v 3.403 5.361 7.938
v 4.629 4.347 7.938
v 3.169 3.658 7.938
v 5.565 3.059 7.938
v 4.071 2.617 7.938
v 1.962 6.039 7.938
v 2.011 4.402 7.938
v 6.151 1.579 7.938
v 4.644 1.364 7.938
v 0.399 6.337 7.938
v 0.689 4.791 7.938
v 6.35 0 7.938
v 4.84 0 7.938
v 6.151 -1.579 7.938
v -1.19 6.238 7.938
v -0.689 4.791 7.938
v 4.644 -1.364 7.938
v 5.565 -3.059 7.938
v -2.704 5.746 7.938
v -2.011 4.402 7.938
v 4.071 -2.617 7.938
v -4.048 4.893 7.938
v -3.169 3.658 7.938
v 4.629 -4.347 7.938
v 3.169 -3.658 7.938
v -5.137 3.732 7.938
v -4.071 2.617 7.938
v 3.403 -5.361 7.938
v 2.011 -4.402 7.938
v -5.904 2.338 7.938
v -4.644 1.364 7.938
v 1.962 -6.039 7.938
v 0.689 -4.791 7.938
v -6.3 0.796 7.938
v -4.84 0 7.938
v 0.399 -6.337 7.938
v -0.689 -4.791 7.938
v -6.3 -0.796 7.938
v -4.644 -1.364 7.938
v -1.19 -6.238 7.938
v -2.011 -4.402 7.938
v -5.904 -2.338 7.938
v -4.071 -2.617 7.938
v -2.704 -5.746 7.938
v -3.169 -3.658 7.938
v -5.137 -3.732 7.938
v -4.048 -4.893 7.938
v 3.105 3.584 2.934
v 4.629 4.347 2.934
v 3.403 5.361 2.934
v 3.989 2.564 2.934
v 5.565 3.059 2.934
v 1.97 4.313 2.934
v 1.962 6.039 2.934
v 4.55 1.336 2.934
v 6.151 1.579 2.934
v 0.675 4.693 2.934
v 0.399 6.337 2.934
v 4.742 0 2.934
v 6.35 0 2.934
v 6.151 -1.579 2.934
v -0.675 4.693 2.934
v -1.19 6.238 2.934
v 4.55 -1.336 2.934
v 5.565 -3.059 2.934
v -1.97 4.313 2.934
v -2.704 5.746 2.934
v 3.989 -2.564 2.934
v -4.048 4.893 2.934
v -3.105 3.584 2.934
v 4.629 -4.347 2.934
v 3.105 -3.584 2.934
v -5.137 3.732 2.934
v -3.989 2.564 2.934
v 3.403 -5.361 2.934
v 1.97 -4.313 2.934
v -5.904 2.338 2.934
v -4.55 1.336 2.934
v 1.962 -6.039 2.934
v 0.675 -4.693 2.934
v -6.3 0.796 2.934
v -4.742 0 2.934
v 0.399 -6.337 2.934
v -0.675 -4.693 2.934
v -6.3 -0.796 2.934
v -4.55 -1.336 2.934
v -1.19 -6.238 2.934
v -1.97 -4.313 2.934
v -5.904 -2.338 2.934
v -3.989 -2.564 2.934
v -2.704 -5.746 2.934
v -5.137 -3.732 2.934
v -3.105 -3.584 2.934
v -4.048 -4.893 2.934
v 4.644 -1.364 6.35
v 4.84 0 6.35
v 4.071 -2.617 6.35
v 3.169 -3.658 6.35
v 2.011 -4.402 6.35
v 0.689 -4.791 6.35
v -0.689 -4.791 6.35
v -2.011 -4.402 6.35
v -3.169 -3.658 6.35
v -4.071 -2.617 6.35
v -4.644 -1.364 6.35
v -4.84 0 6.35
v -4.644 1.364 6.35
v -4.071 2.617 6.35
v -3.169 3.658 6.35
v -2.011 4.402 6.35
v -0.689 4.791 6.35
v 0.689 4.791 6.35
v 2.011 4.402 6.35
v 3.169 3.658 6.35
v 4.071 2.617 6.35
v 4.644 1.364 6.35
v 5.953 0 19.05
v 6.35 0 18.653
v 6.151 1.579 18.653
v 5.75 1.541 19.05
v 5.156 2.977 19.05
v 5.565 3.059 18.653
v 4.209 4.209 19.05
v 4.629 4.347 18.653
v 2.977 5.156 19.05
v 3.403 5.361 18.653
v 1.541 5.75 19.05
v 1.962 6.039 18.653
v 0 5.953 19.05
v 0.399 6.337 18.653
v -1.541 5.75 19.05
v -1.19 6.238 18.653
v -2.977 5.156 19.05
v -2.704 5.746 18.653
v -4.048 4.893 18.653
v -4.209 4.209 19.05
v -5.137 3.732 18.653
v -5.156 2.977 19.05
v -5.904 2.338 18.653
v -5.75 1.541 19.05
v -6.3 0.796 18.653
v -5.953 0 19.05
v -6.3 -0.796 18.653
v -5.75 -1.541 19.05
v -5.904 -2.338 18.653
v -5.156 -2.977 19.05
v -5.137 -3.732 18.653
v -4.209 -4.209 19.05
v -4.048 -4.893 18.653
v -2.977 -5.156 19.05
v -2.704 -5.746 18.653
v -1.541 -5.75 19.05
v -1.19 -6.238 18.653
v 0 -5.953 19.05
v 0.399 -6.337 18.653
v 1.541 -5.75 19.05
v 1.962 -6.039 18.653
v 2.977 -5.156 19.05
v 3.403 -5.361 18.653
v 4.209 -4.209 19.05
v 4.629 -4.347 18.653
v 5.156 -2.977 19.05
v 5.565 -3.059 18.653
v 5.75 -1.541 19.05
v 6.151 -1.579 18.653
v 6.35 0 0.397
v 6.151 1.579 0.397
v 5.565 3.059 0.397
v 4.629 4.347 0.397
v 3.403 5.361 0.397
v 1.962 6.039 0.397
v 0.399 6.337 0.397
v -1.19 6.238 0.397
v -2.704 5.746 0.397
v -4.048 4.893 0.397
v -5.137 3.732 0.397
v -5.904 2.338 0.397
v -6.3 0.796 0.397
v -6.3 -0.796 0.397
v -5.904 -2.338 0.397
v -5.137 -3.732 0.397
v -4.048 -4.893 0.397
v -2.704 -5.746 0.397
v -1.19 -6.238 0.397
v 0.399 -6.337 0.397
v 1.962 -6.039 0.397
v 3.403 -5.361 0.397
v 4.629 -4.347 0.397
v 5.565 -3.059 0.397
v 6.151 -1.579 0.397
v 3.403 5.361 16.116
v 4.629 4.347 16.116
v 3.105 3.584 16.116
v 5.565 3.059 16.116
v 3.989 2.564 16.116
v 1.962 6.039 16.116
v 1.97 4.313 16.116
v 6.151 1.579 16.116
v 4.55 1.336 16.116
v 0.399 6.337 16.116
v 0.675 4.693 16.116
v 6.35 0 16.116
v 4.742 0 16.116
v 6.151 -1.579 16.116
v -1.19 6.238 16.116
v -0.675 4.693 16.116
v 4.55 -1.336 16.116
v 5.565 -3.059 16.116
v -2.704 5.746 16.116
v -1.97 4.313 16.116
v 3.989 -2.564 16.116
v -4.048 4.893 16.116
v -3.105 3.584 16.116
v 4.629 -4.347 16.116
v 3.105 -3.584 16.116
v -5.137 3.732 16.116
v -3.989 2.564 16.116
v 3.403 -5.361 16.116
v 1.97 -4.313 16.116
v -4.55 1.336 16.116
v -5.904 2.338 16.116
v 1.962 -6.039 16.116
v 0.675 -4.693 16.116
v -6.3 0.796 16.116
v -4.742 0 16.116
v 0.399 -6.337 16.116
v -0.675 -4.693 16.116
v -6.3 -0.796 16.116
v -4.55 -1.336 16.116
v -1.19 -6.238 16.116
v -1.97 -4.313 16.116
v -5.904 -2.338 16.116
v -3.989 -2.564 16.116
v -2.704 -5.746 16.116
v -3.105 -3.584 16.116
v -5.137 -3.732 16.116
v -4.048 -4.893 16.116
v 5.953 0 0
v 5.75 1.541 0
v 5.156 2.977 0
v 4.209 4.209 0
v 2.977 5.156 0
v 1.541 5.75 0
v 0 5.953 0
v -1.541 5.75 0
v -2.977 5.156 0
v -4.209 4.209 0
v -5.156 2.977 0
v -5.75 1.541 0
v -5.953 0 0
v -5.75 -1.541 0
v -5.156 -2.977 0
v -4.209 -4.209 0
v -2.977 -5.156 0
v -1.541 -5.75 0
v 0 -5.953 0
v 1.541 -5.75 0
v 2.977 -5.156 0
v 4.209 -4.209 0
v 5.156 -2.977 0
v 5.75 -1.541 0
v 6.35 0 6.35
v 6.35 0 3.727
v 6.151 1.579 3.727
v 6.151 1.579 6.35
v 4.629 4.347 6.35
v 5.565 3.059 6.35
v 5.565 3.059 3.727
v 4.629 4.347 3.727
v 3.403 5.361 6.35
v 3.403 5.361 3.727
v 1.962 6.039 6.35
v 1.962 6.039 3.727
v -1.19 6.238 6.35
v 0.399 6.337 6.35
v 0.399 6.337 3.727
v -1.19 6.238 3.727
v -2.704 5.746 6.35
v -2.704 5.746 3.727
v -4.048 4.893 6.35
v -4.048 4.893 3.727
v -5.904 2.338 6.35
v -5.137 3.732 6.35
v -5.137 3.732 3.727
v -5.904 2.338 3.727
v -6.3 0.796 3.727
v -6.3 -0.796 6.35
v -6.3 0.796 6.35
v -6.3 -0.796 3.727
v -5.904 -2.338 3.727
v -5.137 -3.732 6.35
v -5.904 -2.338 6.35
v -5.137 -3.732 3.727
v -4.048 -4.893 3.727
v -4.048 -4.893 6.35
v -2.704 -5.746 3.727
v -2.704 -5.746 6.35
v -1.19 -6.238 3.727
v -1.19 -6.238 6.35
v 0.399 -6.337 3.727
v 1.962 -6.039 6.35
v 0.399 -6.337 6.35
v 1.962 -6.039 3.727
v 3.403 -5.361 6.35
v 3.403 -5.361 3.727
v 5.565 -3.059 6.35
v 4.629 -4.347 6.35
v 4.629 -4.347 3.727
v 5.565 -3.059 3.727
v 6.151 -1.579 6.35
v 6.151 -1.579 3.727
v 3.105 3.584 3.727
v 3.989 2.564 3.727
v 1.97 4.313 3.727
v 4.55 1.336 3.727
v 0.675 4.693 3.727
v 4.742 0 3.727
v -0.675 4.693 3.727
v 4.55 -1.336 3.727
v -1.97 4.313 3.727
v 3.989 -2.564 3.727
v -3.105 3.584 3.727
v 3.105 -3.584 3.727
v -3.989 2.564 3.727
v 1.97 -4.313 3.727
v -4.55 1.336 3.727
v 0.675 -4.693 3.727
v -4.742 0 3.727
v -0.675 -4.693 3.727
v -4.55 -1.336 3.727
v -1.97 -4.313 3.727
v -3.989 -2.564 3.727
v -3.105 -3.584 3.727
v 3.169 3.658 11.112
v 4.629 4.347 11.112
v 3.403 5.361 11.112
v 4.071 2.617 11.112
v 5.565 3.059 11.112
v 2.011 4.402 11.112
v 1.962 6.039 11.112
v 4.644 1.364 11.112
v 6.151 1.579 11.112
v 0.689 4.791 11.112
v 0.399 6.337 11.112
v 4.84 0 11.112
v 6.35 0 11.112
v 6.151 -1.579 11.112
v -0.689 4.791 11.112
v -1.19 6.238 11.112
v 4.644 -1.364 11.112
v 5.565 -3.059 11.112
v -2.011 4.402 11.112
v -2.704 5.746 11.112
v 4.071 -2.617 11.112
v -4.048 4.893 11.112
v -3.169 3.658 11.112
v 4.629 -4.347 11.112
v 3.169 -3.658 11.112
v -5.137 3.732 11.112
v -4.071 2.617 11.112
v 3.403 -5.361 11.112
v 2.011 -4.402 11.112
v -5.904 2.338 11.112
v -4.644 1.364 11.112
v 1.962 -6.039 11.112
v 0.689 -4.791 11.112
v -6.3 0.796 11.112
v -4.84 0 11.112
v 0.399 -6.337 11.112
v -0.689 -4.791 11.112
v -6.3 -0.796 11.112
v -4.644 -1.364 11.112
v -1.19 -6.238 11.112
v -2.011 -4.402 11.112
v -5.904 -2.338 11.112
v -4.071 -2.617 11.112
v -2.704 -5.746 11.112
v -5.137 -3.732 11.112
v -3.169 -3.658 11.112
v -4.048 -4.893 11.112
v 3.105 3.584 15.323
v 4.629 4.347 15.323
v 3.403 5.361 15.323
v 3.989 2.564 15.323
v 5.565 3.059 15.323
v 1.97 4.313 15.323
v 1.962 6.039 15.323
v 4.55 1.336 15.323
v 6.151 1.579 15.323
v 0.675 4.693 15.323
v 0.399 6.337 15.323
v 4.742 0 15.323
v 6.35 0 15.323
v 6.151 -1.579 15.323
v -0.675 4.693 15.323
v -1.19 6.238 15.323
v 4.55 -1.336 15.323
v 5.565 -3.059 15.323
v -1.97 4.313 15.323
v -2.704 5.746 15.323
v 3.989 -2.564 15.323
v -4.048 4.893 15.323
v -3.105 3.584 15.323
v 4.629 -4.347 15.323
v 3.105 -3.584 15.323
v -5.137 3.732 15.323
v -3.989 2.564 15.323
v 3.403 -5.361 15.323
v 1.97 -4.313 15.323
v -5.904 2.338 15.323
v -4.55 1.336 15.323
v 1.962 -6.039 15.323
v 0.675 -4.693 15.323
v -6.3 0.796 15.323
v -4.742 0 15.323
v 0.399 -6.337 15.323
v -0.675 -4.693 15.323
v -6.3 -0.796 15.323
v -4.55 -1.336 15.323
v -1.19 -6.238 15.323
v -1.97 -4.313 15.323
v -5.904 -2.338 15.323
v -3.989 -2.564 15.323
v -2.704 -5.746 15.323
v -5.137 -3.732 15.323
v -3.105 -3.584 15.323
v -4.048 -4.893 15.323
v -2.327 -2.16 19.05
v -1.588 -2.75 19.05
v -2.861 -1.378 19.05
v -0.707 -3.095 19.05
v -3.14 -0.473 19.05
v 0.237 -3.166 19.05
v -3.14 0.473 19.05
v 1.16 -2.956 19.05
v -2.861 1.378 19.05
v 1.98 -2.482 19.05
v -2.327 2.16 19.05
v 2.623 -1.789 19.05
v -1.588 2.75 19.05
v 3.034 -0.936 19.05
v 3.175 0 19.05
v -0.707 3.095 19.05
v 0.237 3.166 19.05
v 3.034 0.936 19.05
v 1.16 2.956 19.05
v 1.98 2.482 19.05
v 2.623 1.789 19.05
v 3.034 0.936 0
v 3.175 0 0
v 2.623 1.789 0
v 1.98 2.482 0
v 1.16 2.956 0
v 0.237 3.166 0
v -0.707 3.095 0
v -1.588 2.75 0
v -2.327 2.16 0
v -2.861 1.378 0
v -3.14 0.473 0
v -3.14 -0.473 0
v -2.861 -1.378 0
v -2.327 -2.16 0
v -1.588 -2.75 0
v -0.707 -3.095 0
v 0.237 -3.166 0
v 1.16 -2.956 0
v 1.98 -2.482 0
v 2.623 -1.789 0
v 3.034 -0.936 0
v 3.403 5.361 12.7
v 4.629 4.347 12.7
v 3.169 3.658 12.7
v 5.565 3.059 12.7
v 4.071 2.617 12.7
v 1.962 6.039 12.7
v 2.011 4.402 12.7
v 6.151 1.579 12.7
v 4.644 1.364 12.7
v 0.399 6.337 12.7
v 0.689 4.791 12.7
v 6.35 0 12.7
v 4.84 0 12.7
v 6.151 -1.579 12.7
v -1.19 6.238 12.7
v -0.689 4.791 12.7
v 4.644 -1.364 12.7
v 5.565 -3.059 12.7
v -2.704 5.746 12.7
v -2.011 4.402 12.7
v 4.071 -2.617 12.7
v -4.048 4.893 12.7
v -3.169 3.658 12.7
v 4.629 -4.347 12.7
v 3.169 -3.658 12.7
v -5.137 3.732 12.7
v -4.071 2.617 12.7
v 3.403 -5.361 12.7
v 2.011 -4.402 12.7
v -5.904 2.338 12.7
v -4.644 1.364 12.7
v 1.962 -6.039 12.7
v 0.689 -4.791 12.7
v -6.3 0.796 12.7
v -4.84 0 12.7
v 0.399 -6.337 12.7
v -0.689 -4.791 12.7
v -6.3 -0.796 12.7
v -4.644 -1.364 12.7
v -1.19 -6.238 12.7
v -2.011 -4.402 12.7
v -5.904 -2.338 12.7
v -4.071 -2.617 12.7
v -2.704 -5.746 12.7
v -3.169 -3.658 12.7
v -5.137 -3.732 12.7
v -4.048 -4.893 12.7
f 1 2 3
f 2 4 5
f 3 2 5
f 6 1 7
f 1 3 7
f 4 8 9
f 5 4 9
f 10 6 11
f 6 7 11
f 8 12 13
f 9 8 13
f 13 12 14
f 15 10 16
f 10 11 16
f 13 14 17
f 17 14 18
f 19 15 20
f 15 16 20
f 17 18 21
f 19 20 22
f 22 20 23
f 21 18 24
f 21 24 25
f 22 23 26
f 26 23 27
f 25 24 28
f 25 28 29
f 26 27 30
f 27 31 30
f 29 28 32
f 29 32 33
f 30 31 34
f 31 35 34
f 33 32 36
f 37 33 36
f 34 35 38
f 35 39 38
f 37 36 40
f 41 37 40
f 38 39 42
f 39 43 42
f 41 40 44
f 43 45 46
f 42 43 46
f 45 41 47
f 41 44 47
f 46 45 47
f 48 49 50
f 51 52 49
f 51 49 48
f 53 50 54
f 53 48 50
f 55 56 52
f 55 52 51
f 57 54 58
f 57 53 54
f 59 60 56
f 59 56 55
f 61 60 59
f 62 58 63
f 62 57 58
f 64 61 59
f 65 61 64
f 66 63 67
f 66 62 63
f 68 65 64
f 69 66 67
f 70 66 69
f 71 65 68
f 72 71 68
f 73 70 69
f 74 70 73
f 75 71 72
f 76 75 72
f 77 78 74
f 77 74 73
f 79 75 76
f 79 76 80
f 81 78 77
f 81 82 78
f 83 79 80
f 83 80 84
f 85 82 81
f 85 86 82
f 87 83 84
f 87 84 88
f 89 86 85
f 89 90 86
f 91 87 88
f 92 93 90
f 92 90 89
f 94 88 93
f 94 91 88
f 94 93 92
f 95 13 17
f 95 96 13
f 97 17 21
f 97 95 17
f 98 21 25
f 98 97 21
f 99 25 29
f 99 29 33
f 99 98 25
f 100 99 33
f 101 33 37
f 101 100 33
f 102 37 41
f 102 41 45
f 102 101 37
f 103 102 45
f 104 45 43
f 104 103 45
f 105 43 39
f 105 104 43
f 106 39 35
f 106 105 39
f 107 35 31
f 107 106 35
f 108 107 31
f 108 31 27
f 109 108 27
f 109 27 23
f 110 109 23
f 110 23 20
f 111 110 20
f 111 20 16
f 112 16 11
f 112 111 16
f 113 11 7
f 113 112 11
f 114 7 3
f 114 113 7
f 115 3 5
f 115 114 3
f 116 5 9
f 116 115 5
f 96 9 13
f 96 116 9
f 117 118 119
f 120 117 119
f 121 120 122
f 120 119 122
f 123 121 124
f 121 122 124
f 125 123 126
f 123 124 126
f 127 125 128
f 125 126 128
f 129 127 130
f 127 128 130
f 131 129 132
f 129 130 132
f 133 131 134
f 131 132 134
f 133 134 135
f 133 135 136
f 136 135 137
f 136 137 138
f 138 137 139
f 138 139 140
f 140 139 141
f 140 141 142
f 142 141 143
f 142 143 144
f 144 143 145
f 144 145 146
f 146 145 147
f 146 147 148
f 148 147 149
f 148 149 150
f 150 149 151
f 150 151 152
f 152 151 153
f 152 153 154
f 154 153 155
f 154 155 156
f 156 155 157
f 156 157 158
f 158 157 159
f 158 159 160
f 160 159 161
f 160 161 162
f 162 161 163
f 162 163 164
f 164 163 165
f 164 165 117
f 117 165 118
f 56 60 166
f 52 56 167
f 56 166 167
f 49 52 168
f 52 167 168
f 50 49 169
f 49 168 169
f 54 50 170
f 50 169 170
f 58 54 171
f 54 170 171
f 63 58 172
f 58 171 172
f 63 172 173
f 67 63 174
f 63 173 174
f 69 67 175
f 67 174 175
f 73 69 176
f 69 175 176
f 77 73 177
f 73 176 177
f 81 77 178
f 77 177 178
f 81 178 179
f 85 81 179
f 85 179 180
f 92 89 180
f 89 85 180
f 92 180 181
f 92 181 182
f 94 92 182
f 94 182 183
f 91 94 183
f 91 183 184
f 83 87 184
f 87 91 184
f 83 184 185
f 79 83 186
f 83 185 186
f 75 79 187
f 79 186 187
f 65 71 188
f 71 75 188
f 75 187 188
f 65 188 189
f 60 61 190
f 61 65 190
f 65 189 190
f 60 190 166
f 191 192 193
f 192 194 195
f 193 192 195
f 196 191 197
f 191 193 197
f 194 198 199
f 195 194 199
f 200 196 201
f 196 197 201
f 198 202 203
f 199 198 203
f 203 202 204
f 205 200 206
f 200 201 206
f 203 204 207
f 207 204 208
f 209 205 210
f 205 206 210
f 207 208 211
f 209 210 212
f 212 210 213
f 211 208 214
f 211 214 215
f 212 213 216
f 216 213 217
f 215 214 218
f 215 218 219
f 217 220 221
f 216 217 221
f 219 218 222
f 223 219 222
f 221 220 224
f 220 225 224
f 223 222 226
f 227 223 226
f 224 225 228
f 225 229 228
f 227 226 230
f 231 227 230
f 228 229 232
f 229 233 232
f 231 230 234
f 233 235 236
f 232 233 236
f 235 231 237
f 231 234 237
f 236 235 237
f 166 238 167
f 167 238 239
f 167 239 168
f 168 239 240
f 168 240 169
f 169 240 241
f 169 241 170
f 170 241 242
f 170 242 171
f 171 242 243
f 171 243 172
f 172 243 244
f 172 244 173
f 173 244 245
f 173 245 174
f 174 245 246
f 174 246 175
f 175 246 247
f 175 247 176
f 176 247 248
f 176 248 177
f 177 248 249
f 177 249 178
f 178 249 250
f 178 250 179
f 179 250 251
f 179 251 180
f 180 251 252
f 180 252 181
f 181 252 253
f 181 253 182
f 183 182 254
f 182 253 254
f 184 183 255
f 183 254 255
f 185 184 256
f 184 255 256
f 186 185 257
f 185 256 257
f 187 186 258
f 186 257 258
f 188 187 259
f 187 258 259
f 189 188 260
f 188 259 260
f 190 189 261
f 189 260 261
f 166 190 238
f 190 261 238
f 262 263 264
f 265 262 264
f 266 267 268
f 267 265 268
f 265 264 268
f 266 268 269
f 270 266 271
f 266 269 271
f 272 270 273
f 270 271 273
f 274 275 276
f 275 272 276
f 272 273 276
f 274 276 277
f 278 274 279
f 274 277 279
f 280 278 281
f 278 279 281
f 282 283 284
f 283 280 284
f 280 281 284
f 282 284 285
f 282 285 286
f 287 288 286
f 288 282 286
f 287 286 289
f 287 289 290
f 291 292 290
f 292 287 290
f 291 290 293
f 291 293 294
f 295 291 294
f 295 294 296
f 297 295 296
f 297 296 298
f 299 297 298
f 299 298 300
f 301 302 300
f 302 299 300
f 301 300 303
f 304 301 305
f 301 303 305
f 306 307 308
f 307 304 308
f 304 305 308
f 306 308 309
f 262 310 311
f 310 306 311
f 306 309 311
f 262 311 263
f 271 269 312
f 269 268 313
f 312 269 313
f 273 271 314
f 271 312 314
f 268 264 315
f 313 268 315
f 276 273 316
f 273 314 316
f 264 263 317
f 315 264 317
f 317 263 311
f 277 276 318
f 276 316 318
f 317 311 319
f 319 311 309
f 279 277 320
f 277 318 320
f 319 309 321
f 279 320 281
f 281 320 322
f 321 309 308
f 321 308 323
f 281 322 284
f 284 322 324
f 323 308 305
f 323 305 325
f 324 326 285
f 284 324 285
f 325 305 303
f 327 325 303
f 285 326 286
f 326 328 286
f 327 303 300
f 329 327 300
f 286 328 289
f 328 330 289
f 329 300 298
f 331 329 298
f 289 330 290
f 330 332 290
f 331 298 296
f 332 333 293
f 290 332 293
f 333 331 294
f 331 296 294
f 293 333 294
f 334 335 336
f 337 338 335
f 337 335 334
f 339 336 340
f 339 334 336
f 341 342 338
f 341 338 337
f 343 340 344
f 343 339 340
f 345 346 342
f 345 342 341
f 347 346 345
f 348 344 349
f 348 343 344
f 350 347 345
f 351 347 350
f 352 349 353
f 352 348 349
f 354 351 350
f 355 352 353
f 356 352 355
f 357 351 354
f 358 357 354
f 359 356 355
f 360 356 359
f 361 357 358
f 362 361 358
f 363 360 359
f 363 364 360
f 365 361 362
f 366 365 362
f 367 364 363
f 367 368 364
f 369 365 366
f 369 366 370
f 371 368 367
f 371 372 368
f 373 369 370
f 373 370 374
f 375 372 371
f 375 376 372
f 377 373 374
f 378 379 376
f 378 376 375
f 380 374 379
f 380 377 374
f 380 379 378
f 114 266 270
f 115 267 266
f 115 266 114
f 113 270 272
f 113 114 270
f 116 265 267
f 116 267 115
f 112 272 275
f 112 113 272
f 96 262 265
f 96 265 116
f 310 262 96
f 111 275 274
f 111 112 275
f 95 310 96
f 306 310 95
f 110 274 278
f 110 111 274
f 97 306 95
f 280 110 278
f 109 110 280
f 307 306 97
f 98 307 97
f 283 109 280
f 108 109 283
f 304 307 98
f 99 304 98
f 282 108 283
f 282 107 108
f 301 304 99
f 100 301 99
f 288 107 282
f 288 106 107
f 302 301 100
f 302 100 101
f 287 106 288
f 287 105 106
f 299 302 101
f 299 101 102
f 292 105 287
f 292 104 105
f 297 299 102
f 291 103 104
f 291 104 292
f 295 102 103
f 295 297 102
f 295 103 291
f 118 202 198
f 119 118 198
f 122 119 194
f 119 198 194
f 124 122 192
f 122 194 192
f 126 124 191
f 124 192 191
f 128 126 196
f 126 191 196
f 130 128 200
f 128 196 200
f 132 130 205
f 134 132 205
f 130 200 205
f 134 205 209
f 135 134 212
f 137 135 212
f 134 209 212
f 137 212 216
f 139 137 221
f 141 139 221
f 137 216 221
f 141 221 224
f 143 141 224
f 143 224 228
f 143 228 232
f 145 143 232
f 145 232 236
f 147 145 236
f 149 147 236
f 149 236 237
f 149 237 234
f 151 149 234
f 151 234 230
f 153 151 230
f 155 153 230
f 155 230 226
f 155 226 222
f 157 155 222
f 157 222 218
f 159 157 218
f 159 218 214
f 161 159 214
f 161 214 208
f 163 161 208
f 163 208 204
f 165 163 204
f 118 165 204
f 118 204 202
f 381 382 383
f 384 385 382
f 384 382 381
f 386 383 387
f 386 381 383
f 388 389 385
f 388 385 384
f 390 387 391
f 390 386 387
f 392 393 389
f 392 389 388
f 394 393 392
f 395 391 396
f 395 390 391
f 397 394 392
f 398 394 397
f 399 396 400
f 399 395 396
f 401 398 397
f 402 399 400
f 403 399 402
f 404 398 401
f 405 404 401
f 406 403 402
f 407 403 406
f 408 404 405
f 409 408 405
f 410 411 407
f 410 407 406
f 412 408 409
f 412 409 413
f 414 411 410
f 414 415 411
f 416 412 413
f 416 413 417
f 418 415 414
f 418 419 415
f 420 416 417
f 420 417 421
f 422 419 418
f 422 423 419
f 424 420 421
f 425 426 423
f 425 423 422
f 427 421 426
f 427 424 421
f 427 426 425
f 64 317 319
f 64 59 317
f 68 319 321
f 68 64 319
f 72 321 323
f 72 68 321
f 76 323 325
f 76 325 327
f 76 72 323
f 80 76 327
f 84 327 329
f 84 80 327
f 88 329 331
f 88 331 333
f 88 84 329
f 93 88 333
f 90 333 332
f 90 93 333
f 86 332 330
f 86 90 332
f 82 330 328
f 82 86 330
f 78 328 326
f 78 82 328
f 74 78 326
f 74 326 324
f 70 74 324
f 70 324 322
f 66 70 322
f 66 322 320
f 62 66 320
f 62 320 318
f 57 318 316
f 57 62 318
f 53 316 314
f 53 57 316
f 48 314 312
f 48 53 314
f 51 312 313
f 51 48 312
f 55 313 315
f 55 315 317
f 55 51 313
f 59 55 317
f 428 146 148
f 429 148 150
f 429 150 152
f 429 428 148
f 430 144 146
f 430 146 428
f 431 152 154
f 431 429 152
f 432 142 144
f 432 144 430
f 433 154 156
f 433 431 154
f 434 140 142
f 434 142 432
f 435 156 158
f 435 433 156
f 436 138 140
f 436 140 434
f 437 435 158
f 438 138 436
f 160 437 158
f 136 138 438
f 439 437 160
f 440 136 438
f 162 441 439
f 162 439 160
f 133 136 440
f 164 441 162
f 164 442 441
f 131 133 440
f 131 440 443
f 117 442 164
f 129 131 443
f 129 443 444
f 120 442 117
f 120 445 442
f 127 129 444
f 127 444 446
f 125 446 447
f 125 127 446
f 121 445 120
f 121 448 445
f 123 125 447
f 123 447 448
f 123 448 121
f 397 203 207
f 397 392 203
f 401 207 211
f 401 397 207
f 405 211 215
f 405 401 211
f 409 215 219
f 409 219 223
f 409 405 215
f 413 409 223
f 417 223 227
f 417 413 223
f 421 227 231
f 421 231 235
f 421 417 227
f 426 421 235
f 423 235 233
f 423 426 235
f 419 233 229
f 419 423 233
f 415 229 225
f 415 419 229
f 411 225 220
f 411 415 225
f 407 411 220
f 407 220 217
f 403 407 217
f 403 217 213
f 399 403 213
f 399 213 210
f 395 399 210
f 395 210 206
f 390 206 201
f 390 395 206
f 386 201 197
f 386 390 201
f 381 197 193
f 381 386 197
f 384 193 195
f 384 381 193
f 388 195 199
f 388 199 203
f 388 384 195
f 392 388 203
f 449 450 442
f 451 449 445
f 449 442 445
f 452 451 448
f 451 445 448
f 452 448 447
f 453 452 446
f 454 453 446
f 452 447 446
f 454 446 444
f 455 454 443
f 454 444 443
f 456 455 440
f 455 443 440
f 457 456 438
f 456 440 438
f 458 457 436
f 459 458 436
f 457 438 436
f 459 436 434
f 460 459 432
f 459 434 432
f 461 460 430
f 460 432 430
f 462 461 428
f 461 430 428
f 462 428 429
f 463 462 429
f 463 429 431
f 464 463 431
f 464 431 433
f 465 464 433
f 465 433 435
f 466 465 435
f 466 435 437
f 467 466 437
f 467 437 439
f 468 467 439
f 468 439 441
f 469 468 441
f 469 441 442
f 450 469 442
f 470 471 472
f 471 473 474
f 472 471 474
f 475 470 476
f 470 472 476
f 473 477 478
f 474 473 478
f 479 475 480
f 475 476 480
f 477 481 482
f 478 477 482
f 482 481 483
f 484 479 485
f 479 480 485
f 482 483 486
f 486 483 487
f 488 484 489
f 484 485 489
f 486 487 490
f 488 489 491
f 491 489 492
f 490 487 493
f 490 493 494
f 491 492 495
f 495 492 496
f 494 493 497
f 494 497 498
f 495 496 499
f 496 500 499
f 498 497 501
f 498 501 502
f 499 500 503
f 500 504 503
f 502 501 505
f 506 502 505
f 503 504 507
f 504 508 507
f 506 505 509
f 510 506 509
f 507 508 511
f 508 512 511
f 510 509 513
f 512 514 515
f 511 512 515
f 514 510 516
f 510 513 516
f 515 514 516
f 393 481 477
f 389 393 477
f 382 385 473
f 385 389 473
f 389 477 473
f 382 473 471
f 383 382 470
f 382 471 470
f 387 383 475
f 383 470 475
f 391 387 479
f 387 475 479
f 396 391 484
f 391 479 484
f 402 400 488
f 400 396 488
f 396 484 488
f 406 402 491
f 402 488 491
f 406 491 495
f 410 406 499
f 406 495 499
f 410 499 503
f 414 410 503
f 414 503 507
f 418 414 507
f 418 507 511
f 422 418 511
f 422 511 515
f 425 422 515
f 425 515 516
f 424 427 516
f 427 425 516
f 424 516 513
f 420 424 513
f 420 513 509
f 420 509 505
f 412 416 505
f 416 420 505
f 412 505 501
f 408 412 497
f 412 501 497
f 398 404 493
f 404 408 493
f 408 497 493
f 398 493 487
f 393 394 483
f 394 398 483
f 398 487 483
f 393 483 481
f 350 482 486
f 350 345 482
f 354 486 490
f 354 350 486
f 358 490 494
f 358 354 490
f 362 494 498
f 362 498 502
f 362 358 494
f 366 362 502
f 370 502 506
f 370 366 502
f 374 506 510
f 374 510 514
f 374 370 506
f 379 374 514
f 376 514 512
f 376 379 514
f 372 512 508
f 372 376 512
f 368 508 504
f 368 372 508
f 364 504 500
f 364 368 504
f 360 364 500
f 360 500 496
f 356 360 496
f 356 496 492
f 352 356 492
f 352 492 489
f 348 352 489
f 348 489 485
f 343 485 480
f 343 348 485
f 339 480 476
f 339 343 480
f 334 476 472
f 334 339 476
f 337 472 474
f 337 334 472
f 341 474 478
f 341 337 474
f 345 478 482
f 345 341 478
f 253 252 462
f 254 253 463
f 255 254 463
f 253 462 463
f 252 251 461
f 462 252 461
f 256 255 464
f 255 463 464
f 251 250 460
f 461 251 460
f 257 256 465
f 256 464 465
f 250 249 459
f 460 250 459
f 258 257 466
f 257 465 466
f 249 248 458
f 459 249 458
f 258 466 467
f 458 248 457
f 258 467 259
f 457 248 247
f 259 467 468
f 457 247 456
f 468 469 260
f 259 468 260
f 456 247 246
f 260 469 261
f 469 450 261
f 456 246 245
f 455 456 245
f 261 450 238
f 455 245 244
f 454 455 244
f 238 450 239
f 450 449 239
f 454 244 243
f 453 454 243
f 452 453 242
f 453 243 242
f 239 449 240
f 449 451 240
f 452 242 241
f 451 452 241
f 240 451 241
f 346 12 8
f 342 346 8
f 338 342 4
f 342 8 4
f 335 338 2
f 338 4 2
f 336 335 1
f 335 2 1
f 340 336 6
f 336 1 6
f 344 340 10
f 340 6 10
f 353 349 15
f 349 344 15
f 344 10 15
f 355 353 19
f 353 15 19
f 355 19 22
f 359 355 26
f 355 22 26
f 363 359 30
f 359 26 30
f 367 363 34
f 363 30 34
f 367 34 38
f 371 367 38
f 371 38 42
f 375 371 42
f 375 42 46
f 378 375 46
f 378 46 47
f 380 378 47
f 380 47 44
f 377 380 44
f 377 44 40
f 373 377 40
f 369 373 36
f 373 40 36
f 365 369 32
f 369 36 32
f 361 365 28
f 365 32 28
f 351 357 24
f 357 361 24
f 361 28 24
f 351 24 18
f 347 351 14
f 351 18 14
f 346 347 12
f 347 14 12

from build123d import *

# Parameters (mm, degrees)
SKETCH2_R           = 6.35
BOSS_EXTRUDE1_DEPTH = 19.05
SKETCH3_R           = 3.175
CUT_EXTRUDE1_DEPTH  = 20.05
SKETCH4_W           = 3.175
SKETCH4_H           = 0.79375
CHAMFER1_SIZE       = 0.396875
SKETCH5_W           = 3.020451336
SKETCH5_H           = 1.5875


with BuildPart() as part:
    # Sketch2 → Boss-Extrude1 (new body)
    with BuildSketch(Plane.XY):
        Circle(SKETCH2_R)
    extrude(amount=BOSS_EXTRUDE1_DEPTH)

    # Sketch3 → Cut-Extrude1 (cut, through all)
    with BuildSketch(Plane.XY.offset(19.05)):
        Circle(SKETCH3_R)
    extrude(amount=-CUT_EXTRUDE1_DEPTH, mode=Mode.SUBTRACT)

    # Sketch4 → Cut-Revolve1 (revolve, cut)
    with BuildSketch(Plane(origin=(0, 0, 0), x_dir=(1, 0, 0), z_dir=(0, 1, 0))):
        with Locations((6.329219641, -15.719425)):
            Rectangle(SKETCH4_W, SKETCH4_H)
        with Locations((6.329219641, -3.330575)):
            Rectangle(SKETCH4_W, SKETCH4_H)
    revolve(axis=Axis((0, 0, 19.05), (0, 0, -1)), mode=Mode.SUBTRACT)

    # Chamfer1
    chamfer1_edges = [part.edges().sort_by_distance(p)[0] for p in [
        (-6.35, 0, 0),
        (-6.35, 0, 19.05),
    ]]
    chamfer(chamfer1_edges, length=CHAMFER1_SIZE)

    # Sketch5 → Cut-Revolve2 (revolve, cut)
    with BuildSketch(Plane(origin=(0, 0, 0), x_dir=(1, 0, 0), z_dir=(0, 1, 0))):
        with Locations((6.35, -11.90625)):
            Rectangle(SKETCH5_W, SKETCH5_H)
        with Locations((6.35, -7.14375)):
            Rectangle(SKETCH5_W, SKETCH5_H)
    revolve(axis=Axis((0, 0, 19.05), (0, 0, -1)), mode=Mode.SUBTRACT)


solid = part.part
